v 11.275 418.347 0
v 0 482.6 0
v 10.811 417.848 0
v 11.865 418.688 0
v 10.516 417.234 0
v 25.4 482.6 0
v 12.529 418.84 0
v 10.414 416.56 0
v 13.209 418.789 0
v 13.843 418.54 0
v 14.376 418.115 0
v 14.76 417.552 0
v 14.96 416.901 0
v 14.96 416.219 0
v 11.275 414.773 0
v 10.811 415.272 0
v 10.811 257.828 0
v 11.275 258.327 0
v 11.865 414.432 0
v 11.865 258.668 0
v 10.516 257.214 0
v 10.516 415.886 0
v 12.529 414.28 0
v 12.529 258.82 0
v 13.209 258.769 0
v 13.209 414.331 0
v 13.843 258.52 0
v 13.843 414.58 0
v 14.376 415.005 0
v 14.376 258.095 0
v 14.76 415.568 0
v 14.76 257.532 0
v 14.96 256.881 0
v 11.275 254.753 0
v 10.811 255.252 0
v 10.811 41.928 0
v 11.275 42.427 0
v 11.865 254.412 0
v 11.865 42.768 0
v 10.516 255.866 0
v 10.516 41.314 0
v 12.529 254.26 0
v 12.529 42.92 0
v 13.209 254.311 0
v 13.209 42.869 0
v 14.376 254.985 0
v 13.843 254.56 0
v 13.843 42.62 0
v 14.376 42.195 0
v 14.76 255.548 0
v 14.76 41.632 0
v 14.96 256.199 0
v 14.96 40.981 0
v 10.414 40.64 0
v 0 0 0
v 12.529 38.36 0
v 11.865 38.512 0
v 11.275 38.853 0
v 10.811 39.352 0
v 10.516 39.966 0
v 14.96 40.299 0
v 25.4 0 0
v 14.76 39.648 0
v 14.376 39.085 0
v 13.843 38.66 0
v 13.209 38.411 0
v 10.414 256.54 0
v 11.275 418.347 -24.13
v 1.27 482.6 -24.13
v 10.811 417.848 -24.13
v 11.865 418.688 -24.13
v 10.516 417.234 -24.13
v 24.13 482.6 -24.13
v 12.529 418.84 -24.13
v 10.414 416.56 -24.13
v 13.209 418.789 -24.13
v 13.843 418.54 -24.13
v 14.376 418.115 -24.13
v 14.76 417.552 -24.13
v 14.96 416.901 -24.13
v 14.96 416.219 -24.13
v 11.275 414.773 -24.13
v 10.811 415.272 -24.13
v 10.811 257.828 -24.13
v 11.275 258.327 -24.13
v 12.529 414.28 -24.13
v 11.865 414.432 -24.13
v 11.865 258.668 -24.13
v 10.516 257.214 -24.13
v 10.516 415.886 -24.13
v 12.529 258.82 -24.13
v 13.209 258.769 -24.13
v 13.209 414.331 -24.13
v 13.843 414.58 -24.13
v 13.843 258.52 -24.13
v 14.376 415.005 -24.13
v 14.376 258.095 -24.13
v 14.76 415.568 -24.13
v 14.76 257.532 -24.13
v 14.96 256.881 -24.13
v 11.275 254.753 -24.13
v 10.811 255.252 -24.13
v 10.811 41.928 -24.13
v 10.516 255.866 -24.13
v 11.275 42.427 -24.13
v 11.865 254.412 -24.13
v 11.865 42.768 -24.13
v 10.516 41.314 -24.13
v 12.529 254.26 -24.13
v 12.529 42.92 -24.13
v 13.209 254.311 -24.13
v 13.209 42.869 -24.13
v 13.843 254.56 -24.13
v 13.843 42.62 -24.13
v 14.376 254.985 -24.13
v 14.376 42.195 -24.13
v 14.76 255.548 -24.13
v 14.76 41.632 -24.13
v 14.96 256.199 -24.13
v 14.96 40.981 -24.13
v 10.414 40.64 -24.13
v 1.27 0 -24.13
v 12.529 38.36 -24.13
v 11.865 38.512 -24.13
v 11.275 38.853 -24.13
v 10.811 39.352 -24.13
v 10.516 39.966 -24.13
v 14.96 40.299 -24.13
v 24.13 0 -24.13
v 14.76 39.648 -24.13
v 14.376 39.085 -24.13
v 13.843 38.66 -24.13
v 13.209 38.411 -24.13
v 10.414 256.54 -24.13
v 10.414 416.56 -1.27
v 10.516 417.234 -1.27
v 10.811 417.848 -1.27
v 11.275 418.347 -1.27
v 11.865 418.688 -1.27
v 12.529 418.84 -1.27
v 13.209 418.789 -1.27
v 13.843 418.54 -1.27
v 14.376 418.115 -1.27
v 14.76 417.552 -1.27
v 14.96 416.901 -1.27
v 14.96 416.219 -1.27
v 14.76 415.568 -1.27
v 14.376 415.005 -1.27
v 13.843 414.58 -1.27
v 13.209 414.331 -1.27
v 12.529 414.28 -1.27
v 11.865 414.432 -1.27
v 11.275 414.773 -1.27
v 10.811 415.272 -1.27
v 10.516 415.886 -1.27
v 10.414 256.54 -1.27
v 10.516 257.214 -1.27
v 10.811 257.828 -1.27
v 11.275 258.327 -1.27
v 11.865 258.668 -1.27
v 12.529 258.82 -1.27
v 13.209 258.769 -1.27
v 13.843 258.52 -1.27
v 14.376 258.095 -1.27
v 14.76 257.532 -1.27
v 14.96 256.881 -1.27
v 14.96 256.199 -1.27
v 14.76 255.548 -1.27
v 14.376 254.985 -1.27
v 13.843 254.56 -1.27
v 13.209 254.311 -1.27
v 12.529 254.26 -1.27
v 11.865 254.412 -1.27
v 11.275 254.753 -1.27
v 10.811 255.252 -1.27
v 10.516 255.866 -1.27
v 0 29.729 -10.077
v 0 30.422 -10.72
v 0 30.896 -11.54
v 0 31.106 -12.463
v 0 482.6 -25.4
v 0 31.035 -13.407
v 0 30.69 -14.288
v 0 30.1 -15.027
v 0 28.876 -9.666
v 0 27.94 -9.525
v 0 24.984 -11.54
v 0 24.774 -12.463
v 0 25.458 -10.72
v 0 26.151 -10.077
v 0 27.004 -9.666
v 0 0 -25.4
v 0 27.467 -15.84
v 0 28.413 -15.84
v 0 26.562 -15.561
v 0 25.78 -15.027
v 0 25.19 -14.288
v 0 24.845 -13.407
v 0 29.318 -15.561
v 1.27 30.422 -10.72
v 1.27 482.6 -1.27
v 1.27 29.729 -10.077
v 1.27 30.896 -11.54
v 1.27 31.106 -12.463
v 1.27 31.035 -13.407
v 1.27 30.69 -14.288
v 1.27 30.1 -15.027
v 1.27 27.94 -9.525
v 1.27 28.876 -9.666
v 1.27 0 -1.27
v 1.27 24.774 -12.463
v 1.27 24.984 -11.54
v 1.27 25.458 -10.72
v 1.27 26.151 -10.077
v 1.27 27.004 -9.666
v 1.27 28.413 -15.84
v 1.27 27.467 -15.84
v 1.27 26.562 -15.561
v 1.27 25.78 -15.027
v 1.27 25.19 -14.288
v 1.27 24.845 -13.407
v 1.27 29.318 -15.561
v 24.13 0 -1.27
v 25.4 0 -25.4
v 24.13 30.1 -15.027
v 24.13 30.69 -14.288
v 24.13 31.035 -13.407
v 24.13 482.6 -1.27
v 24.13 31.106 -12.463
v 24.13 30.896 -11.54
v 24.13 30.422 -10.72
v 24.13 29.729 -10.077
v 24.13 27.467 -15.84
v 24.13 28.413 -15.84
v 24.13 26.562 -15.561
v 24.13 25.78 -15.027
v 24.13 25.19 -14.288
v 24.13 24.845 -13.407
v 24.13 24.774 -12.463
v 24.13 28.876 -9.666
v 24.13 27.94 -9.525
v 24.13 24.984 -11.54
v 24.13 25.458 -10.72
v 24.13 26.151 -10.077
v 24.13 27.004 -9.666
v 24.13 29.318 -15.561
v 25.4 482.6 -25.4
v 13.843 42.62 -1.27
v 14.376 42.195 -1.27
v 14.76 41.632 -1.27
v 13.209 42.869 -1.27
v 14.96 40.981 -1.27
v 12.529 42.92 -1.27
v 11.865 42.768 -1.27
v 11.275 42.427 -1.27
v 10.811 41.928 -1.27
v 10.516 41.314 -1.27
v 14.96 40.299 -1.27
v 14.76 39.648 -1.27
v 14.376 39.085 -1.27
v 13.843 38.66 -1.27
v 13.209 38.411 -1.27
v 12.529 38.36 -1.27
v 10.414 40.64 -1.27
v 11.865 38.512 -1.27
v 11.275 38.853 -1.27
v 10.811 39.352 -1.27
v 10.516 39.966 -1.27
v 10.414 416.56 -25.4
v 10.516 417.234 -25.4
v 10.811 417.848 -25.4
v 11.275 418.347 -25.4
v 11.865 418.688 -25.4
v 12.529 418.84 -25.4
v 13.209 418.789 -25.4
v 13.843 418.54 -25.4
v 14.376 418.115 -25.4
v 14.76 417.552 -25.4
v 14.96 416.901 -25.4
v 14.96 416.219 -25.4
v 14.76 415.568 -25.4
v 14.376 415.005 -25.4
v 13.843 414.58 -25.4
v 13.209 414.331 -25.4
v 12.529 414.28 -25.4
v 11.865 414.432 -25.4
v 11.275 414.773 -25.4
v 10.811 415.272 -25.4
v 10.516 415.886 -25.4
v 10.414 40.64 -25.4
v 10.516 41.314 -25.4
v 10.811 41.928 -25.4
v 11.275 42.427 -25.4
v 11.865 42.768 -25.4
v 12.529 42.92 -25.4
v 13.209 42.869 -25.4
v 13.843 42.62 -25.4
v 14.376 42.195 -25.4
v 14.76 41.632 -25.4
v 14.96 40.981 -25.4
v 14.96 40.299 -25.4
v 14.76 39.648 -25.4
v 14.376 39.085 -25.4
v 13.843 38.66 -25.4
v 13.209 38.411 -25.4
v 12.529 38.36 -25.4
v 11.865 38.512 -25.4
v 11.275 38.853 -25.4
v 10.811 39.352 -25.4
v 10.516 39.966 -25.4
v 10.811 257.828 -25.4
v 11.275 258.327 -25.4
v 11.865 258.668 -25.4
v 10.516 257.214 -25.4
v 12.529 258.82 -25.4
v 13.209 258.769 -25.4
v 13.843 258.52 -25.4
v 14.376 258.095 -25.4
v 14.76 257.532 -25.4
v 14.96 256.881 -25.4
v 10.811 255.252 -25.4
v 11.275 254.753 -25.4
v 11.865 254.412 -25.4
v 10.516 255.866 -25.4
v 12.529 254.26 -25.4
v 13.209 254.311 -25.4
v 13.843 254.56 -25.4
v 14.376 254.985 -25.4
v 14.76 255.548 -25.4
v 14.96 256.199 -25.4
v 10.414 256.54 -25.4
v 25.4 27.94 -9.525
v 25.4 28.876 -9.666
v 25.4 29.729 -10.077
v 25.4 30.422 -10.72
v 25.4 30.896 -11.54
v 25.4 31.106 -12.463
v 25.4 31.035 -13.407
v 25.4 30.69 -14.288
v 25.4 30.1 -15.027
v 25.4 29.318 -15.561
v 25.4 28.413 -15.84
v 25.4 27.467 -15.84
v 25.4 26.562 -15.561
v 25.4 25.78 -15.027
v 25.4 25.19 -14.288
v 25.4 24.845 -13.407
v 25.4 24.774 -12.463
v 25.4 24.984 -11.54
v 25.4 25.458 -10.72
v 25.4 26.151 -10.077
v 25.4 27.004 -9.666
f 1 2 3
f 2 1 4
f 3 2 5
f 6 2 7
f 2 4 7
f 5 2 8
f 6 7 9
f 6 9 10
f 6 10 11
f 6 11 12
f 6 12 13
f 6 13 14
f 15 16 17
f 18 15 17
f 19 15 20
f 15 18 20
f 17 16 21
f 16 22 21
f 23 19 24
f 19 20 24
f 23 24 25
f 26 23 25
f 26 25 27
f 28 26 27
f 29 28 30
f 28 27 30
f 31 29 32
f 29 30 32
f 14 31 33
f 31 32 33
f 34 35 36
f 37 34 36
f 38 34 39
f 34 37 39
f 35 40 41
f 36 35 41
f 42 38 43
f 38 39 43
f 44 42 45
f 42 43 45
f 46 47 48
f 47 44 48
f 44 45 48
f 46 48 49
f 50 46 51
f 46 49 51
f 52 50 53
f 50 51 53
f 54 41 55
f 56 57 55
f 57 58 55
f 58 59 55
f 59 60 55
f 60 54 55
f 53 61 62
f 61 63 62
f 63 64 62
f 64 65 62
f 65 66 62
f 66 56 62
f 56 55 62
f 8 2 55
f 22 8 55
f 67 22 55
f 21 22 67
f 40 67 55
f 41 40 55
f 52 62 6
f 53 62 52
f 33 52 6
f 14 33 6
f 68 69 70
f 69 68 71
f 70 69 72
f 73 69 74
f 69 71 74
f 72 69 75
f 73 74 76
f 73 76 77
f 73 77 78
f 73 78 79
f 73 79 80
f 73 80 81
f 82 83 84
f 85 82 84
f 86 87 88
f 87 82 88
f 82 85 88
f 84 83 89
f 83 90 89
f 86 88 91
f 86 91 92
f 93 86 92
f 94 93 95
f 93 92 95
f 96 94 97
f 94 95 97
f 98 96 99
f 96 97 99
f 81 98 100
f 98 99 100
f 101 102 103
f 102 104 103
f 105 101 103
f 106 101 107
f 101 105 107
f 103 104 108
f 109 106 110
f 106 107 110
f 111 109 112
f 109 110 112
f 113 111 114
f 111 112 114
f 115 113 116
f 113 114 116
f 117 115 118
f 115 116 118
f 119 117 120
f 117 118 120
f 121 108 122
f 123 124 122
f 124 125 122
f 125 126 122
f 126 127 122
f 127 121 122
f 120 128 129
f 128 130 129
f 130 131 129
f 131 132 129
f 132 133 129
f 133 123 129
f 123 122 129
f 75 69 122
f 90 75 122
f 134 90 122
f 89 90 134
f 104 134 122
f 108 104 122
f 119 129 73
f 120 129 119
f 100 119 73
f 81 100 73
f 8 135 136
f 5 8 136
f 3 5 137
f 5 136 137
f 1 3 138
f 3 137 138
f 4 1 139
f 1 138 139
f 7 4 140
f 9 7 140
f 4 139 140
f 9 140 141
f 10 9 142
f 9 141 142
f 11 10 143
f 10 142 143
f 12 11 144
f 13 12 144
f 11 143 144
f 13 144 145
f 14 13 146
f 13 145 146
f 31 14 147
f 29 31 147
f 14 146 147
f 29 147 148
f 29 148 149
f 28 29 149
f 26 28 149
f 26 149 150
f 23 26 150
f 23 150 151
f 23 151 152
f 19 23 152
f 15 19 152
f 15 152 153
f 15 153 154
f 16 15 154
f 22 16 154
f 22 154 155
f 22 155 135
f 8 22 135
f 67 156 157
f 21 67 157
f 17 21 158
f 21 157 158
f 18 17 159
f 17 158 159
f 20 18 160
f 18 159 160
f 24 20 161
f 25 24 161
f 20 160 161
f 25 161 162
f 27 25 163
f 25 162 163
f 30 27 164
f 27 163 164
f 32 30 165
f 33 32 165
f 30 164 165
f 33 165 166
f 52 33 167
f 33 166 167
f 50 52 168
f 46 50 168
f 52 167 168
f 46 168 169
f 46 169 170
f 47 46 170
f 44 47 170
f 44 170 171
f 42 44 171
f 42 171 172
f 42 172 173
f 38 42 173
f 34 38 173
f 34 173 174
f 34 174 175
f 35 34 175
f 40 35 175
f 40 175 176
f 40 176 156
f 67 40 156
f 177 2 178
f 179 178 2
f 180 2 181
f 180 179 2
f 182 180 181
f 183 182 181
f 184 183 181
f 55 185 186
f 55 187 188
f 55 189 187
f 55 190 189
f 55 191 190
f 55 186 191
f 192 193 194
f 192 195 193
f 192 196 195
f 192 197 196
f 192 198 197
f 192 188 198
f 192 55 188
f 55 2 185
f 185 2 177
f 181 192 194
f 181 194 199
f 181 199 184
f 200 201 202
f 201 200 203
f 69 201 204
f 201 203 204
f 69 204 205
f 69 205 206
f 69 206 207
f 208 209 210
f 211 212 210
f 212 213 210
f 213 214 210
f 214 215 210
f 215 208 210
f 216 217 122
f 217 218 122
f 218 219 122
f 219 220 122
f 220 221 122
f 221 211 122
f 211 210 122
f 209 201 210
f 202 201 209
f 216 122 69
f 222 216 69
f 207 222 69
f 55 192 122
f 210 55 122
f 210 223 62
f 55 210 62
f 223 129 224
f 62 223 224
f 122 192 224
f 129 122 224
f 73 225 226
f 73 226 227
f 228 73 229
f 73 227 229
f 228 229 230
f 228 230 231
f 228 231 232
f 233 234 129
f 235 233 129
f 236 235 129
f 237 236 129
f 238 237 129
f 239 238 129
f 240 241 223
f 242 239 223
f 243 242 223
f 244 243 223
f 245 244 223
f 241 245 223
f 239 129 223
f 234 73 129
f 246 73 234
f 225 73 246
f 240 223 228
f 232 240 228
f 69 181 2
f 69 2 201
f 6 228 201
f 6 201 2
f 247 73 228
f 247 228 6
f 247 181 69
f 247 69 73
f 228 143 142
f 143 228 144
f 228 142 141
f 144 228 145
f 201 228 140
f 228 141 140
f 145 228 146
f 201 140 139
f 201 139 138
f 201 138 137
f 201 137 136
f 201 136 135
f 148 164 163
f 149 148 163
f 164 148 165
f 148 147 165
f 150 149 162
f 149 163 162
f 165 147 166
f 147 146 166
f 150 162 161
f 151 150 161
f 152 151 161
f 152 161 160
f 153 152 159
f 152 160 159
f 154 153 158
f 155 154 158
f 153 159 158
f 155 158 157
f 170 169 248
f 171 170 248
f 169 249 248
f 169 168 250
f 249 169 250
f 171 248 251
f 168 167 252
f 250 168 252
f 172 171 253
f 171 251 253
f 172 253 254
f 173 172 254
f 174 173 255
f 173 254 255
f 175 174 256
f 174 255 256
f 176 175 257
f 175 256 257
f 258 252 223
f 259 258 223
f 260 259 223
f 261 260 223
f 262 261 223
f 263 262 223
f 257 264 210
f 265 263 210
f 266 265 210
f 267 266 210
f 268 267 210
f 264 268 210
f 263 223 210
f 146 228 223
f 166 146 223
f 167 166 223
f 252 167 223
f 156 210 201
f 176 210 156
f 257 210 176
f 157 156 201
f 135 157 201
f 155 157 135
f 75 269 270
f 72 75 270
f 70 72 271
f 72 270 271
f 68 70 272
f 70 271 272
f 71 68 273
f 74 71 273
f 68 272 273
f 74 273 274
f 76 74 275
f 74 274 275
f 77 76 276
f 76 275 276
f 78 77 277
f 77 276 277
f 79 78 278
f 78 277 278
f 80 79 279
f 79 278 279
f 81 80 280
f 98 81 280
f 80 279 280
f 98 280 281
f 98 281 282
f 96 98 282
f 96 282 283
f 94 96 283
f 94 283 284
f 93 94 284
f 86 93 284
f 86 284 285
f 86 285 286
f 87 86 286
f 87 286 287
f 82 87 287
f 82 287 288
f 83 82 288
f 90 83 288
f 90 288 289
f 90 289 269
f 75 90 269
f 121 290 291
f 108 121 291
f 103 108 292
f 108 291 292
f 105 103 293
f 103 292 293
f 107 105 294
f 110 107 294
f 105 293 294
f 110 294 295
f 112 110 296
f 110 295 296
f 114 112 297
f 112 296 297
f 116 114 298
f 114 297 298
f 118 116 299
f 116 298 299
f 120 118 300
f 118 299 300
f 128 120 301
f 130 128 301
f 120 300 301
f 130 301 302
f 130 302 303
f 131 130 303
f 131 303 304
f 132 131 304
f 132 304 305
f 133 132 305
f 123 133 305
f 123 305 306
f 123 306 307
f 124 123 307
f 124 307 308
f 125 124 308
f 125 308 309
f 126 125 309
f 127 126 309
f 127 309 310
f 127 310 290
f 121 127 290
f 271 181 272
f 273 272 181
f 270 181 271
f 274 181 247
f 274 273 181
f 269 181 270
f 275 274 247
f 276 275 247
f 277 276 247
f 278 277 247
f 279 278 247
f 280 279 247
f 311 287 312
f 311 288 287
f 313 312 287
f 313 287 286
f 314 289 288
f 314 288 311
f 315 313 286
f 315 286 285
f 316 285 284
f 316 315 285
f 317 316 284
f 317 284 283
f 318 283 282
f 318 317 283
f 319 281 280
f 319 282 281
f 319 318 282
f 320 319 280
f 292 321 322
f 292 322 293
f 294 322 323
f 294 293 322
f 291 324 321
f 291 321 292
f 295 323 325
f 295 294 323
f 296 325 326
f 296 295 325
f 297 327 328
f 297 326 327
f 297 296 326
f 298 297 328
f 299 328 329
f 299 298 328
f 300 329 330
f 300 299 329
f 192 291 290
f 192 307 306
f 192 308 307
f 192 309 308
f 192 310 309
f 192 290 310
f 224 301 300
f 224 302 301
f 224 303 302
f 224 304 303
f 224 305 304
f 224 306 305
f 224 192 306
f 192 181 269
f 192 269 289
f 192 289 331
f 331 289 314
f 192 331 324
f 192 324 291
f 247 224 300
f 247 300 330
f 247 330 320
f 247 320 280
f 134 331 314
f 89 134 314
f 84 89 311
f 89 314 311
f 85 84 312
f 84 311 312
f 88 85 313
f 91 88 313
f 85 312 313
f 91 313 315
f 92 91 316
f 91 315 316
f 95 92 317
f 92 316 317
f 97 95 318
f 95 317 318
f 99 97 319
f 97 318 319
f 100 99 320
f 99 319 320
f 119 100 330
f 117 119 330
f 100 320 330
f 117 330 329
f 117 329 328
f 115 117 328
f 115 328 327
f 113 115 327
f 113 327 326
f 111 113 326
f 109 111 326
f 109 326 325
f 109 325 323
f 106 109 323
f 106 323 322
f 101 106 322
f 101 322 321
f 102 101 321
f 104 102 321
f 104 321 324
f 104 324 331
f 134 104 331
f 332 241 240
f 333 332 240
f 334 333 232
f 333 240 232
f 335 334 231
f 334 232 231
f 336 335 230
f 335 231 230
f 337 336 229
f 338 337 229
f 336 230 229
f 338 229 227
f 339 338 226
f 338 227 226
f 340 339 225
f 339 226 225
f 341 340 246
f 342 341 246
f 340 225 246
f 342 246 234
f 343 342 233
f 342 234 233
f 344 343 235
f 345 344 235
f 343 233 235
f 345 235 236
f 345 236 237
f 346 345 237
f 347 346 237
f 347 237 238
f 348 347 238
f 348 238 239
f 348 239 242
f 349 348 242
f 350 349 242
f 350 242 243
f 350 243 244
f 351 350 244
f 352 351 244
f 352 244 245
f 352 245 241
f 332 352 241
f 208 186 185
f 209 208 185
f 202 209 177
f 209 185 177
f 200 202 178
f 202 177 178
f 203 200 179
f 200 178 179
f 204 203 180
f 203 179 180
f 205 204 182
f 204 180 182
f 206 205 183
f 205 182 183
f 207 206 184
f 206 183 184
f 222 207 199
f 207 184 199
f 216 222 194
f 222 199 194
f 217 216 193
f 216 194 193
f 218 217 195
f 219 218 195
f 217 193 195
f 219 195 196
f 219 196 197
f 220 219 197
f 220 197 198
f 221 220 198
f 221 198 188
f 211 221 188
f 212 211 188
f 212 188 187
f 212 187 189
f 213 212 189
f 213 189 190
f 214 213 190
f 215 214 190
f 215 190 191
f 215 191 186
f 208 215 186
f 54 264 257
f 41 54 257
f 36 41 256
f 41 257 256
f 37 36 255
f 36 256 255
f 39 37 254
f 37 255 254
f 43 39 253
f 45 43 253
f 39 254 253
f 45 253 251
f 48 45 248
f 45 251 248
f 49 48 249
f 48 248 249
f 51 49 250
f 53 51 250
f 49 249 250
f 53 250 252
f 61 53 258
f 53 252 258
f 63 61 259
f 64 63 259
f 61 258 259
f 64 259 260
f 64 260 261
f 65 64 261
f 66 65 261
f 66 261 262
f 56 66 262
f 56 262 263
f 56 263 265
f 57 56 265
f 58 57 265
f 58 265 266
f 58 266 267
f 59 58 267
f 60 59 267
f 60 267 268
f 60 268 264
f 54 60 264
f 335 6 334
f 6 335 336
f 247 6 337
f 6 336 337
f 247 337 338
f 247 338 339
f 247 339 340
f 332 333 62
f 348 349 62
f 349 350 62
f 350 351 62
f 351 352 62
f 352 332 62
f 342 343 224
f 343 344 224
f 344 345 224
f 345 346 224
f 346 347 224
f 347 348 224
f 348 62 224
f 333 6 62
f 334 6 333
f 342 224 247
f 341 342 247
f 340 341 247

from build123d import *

# Parameters (mm, degrees)
SKETCH1_W           = 25.4
SKETCH1_H           = 25.4
BOSS_EXTRUDE1_DEPTH = 482.6
SKETCH2_R           = 2.286
CUT_EXTRUDE1_DEPTH  = 484.934995635
SKETCH3_R           = 2.286
CUT_EXTRUDE2_DEPTH  = 484.934995635
SKETCH4_R           = 2.286
CUT_EXTRUDE3_DEPTH  = 484.934995635
SKETCH9_R           = 3.175
CUT_EXTRUDE8_DEPTH  = 484.934995635


with BuildPart() as part:
    # Sketch1 → Boss-Extrude1 (new body)
    with BuildSketch(Plane(origin=(0, 0, 0), x_dir=(1, 0, 0), z_dir=(0, 1, 0))):
        with Locations((12.7, 12.7)):
            Rectangle(SKETCH1_W, SKETCH1_H)
        Polygon((1.27, 12.361459156), (1.27, 24.13), (12.7, 24.13), (24.13, 24.13), (24.13, 12.7), (24.13, 1.27), (12.7, 1.27), (1.27, 1.27), align=None, mode=Mode.SUBTRACT)
    extrude(amount=BOSS_EXTRUDE1_DEPTH)

    # Sketch2 → Cut-Extrude1 (cut, through all)
    with BuildSketch(Plane(origin=(0, 0, -25.4), x_dir=(-1, 0, 0), z_dir=(0, 0, -1))):
        with Locations((-12.7, 416.56)):
            Circle(SKETCH2_R)
    extrude(amount=-CUT_EXTRUDE1_DEPTH, mode=Mode.SUBTRACT)

    # Sketch3 → Cut-Extrude2 (cut, through all)
    with BuildSketch(Plane(origin=(0, 0, -25.4), x_dir=(-1, 0, 0), z_dir=(0, 0, -1))):
        with Locations((-12.7, 40.64)):
            Circle(SKETCH3_R)
    extrude(amount=-CUT_EXTRUDE2_DEPTH, mode=Mode.SUBTRACT)

    # Sketch4 → Cut-Extrude3 (cut, through all)
    with BuildSketch(Plane(origin=(0, 0, -25.4), x_dir=(-1, 0, 0), z_dir=(0, 0, -1))):
        with Locations((-12.7, 256.54)):
            Circle(SKETCH4_R)
    extrude(amount=-CUT_EXTRUDE3_DEPTH, mode=Mode.SUBTRACT)

    # Sketch9 → Cut-Extrude8 (cut, through all)
    with BuildSketch(Plane.ZY):
        with Locations((-12.7, 27.94)):
            Circle(SKETCH9_R)
    extrude(amount=-CUT_EXTRUDE8_DEPTH, mode=Mode.SUBTRACT)


solid = part.part
